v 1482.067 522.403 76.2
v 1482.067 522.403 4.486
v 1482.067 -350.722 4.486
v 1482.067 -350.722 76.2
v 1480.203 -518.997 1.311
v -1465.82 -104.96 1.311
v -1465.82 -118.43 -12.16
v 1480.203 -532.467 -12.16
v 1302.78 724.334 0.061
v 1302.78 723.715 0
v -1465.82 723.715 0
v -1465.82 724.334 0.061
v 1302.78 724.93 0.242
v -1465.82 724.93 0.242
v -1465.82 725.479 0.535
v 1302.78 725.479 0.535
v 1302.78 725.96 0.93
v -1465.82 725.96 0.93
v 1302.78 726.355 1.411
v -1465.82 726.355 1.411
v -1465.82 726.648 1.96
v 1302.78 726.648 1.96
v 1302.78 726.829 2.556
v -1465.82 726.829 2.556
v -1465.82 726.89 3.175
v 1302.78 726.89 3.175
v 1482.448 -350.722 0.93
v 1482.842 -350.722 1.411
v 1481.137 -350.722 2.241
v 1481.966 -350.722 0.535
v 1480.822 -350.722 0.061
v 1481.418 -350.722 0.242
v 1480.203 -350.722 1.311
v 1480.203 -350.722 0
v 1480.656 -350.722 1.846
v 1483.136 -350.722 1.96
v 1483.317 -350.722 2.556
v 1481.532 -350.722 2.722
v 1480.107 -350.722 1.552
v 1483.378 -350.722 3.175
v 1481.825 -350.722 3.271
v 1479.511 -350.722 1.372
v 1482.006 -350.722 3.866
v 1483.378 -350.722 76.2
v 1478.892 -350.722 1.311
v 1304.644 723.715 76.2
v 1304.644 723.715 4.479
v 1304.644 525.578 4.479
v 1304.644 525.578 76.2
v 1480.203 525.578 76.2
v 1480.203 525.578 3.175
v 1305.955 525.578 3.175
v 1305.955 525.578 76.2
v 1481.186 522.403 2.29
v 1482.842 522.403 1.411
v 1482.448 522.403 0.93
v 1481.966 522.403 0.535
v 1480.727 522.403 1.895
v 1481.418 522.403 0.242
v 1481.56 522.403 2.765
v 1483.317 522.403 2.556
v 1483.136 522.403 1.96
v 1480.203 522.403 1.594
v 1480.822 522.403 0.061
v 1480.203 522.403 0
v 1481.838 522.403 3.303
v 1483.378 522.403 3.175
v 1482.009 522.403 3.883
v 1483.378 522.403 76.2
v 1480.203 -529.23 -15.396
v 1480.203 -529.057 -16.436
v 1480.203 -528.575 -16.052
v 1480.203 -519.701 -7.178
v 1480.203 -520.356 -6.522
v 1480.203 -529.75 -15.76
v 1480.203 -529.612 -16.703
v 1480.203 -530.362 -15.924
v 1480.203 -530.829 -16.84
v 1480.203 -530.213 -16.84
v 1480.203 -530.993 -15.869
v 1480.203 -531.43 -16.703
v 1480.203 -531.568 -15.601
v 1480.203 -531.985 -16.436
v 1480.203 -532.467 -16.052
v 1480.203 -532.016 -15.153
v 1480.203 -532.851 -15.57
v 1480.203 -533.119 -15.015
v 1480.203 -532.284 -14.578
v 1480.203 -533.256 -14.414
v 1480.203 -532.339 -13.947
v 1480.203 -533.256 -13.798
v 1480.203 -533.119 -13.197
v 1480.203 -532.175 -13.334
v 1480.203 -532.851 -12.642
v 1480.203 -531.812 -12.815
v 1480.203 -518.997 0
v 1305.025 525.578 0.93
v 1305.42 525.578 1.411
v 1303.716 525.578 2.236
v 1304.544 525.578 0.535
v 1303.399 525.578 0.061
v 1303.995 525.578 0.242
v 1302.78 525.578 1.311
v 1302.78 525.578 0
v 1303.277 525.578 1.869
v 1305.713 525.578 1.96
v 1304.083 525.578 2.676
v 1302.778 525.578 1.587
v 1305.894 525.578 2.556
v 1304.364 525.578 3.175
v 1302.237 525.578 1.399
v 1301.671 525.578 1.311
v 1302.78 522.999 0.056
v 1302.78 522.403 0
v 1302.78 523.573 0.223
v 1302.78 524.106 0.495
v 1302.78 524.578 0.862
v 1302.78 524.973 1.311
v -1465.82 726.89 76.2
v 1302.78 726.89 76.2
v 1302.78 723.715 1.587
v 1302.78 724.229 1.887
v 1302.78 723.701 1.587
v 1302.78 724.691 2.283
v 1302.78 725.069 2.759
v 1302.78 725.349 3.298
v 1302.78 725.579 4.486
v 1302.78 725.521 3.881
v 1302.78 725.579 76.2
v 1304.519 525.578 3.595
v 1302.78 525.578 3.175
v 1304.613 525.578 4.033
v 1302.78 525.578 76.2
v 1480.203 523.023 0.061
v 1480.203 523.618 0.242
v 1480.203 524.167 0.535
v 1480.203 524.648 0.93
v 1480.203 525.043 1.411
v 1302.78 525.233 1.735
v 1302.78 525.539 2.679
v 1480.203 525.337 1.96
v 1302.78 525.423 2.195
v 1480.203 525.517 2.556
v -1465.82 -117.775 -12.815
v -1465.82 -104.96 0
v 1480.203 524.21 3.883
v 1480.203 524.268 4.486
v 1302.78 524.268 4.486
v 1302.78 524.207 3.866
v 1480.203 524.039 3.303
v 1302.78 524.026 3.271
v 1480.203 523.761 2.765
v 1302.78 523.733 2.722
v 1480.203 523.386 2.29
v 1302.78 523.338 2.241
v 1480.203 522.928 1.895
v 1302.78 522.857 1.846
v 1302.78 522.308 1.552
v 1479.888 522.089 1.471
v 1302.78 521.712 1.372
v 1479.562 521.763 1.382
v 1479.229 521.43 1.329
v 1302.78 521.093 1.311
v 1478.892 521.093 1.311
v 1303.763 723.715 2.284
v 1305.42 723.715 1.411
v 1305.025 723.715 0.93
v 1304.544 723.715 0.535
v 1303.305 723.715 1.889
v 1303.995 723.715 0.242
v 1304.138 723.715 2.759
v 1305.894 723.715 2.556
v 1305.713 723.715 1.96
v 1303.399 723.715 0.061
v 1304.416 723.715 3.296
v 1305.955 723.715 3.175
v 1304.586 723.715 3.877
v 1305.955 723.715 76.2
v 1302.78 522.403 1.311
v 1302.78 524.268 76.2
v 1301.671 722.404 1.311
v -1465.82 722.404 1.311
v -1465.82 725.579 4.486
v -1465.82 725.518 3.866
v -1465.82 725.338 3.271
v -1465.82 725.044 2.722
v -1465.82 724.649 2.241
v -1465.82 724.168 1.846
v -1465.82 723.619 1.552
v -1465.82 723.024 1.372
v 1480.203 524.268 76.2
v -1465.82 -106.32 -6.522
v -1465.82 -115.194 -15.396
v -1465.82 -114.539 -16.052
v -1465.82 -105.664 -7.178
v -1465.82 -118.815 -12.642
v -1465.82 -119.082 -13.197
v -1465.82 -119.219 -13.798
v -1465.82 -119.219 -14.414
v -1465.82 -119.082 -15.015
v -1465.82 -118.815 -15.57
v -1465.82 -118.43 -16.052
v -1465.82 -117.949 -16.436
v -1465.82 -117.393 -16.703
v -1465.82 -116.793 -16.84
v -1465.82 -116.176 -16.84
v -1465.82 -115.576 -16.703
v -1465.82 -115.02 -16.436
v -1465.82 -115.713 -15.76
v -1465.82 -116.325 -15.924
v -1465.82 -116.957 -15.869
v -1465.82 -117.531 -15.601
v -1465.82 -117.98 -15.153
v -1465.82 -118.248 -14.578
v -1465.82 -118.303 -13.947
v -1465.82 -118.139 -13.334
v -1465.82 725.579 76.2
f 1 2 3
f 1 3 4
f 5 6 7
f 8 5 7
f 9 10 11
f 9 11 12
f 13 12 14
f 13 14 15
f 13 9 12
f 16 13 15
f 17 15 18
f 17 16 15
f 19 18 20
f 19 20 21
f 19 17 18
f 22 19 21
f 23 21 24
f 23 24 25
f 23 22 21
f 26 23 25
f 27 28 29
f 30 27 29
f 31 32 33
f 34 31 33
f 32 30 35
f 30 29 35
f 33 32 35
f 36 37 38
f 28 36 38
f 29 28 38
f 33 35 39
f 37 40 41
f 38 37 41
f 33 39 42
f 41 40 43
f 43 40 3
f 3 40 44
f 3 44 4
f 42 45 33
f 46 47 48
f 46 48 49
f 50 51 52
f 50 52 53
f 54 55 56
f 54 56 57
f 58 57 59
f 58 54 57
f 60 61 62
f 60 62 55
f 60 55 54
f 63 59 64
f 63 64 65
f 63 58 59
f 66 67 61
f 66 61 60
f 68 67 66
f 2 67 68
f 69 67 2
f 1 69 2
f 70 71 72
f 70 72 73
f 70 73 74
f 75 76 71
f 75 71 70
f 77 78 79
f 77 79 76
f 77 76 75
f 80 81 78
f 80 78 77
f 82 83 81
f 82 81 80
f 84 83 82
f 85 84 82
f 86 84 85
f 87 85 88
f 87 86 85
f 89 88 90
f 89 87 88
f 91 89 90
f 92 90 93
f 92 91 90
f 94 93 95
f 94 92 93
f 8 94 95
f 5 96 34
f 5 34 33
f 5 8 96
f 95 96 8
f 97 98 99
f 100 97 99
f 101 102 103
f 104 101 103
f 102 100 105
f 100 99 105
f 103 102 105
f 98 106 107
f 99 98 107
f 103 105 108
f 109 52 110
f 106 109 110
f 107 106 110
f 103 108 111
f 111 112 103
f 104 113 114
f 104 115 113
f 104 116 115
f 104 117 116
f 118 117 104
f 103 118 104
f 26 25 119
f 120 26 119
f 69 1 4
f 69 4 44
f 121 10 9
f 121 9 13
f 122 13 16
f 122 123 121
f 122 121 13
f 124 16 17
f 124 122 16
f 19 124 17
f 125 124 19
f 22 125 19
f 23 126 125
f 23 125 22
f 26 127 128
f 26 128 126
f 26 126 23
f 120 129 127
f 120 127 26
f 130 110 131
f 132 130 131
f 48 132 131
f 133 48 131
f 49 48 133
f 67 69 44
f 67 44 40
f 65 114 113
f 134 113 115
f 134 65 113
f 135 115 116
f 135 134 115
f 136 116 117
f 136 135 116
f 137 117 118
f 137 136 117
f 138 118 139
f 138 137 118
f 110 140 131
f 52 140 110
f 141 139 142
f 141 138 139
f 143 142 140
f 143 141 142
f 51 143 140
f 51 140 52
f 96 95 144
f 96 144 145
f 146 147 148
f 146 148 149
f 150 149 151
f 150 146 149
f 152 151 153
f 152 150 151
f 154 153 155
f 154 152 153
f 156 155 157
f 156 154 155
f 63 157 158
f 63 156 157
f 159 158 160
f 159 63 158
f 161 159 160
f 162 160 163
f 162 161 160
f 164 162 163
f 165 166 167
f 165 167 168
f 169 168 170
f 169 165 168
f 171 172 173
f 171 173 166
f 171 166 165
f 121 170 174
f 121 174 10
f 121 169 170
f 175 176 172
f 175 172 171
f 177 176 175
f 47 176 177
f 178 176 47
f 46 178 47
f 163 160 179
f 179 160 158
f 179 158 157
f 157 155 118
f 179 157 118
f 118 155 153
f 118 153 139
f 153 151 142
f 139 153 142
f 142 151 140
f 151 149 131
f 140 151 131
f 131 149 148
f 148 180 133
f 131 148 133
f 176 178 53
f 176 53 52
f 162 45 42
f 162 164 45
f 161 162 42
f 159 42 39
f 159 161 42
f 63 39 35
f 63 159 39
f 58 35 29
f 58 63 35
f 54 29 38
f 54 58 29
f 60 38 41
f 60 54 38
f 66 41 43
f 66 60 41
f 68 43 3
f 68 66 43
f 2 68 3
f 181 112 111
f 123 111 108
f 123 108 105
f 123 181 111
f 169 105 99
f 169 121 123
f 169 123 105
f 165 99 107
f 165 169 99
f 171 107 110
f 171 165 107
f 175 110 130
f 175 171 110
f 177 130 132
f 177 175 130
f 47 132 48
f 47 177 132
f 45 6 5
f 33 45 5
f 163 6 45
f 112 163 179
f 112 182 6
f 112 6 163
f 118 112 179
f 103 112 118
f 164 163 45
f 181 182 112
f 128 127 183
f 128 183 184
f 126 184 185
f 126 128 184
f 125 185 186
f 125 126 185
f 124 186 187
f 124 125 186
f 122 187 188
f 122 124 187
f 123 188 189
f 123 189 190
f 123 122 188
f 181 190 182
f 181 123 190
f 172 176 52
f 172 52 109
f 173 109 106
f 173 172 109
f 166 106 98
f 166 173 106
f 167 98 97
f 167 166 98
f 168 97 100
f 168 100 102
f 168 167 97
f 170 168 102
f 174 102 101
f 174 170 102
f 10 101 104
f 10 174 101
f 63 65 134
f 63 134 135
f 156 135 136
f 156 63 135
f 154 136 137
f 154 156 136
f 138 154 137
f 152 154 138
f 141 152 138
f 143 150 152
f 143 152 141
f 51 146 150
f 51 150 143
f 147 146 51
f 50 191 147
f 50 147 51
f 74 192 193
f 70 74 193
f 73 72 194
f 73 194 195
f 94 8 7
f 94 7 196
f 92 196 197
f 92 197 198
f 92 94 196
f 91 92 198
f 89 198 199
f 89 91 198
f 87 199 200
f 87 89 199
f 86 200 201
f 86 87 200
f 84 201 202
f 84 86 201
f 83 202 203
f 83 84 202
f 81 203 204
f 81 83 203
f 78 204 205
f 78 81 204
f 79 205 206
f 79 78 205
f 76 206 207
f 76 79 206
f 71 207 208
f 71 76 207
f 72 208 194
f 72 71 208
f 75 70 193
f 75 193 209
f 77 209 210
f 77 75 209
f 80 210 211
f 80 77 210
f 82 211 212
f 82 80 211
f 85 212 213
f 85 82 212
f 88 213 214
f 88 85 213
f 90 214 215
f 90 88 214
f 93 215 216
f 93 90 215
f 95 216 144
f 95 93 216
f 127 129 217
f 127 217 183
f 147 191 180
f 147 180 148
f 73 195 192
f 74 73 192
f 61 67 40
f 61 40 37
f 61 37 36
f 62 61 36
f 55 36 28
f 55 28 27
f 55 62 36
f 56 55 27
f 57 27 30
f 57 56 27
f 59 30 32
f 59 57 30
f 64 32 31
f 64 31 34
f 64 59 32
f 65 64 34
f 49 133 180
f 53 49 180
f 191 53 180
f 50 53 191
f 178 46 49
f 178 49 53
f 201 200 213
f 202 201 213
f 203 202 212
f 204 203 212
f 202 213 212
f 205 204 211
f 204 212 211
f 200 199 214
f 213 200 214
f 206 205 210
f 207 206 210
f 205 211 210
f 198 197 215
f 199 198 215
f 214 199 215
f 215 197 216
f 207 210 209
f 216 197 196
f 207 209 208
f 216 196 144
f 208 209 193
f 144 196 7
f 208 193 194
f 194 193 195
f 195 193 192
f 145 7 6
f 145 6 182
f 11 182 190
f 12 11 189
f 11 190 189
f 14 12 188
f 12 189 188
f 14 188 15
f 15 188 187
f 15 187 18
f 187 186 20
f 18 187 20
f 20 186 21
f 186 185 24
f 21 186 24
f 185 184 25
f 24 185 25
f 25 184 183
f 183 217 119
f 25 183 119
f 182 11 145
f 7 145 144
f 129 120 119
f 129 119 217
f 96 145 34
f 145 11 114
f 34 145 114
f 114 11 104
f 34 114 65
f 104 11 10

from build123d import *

# Parameters (mm, degrees)
F1_DEPTH  = 1.31064
F6_DEPTH  = 873.125
F9_DEPTH  = 2768.6
F10_DEPTH = 177.4227478045
F11_DEPTH = 198.1364960287


with BuildPart() as f1:
    # F0 (on Top) → F1 (new body)
    with BuildSketch(Plane.XY):
        Polygon((1302.7797686103, 723.7149244852), (-1465.8202313897, 723.7149244852), (-1465.8202313897, -104.9600755148), (1480.2025164147, -518.9965715435), (1480.2025164147, 522.4034284565), (1302.7797686103, 522.4034284565), align=None)
    extrude(amount=F1_DEPTH)

    # F3: sweep along a path in F3_path
    with BuildLine(Plane(origin=(-1465.8202313897, -104.9600755148, 1.31064), x_dir=(-0.9902680687, 0.139173101, 0), z_dir=(-0.139173101, -0.9902680687, 0))) as f3_path:
        Line((0, 0), (-2974.975, 0))
    # F2 (on face) → F3 (sweep)
    with BuildSketch(Plane.YZ.offset(1480.2025164147)):
        with BuildLine():
            Line((-518.9965715435, 0), (-518.9965715435, 1.31064))
            Line((-518.9965715435, 1.31064), (-532.4669557251, -12.1597441816))
            ThreePointArc((-532.4669557251, -12.1597441816), (-532.4669557251, -16.0516650142), (-528.5750348925, -16.0516650142))
            Line((-528.5750348925, -16.0516650142), (-519.7009649314, -7.1775950531))
            Line((-519.7009649314, -7.1775950531), (-520.3562849314, -6.5222750531))
            Line((-520.3562849314, -6.5222750531), (-529.2303548925, -15.3963450142))
            ThreePointArc((-529.2303548925, -15.3963450142), (-531.8116357251, -15.3963450142), (-531.8116357251, -12.8150641816))
            Line((-531.8116357251, -12.8150641816), (-518.9965715435, 0))
        make_face()
    sweep(path=f3_path.line)

    # F5 (on face) → F6 (join)
    with BuildSketch(Plane(origin=(0, 522.4034284565, 0), x_dir=(-1, 0, 0), z_dir=(0, 1, 0))):
        with BuildLine():
            Line((-1483.3775164147, 76.2), (-1483.3775164147, 3.175))
            ThreePointArc((-1483.3775164147, 3.175), (-1482.447580445, 0.9299359697), (-1480.2025164147, 0))
            Line((-1480.2025164147, 0), (-1480.2025164147, 1.31064))
            Line((-1480.2025164147, 1.31064), (-1478.8918764147, 1.31064))
            ThreePointArc((-1478.8918764147, 1.31064), (-1481.136940445, 2.2405759697), (-1482.0668764147, 4.48564))
            Line((-1482.0668764147, 4.48564), (-1482.0668764147, 76.2))
            Line((-1482.0668764147, 76.2), (-1483.3775164147, 76.2))
        make_face()
    extrude(amount=-F6_DEPTH)

    # F7 (on face) → F9 (join, through all)
    with BuildSketch(Plane.YZ.offset(1302.7797686103)):
        with BuildLine():
            ThreePointArc((723.7149244852, 0), (725.9599885154, 0.9299359697), (726.8899244852, 3.175))
            Line((726.8899244852, 3.175), (726.8899244852, 76.2))
            Line((726.8899244852, 76.2), (725.5792844852, 76.2))
            Line((725.5792844852, 76.2), (725.5792844852, 4.48564))
            ThreePointArc((725.5792844852, 4.48564), (724.6493485154, 2.2405759697), (722.4042844852, 1.31064))
            Line((722.4042844852, 1.31064), (723.7149244852, 1.31064))
            Line((723.7149244852, 1.31064), (723.7149244852, 0))
        make_face()
    extrude(amount=-F9_DEPTH)

    # F4 (on face) → F10 (join, through all)
    with BuildSketch(Plane.YZ.offset(1480.2025164147)):
        with BuildLine():
            ThreePointArc((522.4034284565, 0), (524.6484924868, 0.9299359697), (525.5784284565, 3.175))
            Line((525.5784284565, 3.175), (525.5784284565, 76.2))
            Line((525.5784284565, 76.2), (524.2677884565, 76.2))
            Line((524.2677884565, 76.2), (524.2677884565, 4.48564))
            ThreePointArc((524.2677884565, 4.48564), (523.3378524868, 2.2405759697), (521.0927884565, 1.31064))
            Line((521.0927884565, 1.31064), (522.4034284565, 1.31064))
            Line((522.4034284565, 1.31064), (522.4034284565, 0))
        make_face()
    extrude(amount=-F10_DEPTH)

    # F8 (on face) → F11 (join, through all)
    with BuildSketch(Plane(origin=(0, 723.7149244852, 0), x_dir=(-1, 0, 0), z_dir=(0, 1, 0))):
        with BuildLine():
            Line((-1305.9547686103, 76.2), (-1305.9547686103, 3.175))
            ThreePointArc((-1305.9547686103, 3.175), (-1305.0248326405, 0.9299359697), (-1302.7797686103, 0))
            Line((-1302.7797686103, 0), (-1302.7797686103, 1.31064))
            Line((-1302.7797686103, 1.31064), (-1301.6712787008, 1.31064))
            ThreePointArc((-1301.6712787008, 1.31064), (-1303.7845607014, 2.3067802547), (-1304.6441286103, 4.4791980855))
            Line((-1304.6441286103, 4.4791980855), (-1304.6441286103, 76.2))
            Line((-1304.6441286103, 76.2), (-1305.9547686103, 76.2))
        make_face()
    extrude(amount=-F11_DEPTH)


solid = f1.part
